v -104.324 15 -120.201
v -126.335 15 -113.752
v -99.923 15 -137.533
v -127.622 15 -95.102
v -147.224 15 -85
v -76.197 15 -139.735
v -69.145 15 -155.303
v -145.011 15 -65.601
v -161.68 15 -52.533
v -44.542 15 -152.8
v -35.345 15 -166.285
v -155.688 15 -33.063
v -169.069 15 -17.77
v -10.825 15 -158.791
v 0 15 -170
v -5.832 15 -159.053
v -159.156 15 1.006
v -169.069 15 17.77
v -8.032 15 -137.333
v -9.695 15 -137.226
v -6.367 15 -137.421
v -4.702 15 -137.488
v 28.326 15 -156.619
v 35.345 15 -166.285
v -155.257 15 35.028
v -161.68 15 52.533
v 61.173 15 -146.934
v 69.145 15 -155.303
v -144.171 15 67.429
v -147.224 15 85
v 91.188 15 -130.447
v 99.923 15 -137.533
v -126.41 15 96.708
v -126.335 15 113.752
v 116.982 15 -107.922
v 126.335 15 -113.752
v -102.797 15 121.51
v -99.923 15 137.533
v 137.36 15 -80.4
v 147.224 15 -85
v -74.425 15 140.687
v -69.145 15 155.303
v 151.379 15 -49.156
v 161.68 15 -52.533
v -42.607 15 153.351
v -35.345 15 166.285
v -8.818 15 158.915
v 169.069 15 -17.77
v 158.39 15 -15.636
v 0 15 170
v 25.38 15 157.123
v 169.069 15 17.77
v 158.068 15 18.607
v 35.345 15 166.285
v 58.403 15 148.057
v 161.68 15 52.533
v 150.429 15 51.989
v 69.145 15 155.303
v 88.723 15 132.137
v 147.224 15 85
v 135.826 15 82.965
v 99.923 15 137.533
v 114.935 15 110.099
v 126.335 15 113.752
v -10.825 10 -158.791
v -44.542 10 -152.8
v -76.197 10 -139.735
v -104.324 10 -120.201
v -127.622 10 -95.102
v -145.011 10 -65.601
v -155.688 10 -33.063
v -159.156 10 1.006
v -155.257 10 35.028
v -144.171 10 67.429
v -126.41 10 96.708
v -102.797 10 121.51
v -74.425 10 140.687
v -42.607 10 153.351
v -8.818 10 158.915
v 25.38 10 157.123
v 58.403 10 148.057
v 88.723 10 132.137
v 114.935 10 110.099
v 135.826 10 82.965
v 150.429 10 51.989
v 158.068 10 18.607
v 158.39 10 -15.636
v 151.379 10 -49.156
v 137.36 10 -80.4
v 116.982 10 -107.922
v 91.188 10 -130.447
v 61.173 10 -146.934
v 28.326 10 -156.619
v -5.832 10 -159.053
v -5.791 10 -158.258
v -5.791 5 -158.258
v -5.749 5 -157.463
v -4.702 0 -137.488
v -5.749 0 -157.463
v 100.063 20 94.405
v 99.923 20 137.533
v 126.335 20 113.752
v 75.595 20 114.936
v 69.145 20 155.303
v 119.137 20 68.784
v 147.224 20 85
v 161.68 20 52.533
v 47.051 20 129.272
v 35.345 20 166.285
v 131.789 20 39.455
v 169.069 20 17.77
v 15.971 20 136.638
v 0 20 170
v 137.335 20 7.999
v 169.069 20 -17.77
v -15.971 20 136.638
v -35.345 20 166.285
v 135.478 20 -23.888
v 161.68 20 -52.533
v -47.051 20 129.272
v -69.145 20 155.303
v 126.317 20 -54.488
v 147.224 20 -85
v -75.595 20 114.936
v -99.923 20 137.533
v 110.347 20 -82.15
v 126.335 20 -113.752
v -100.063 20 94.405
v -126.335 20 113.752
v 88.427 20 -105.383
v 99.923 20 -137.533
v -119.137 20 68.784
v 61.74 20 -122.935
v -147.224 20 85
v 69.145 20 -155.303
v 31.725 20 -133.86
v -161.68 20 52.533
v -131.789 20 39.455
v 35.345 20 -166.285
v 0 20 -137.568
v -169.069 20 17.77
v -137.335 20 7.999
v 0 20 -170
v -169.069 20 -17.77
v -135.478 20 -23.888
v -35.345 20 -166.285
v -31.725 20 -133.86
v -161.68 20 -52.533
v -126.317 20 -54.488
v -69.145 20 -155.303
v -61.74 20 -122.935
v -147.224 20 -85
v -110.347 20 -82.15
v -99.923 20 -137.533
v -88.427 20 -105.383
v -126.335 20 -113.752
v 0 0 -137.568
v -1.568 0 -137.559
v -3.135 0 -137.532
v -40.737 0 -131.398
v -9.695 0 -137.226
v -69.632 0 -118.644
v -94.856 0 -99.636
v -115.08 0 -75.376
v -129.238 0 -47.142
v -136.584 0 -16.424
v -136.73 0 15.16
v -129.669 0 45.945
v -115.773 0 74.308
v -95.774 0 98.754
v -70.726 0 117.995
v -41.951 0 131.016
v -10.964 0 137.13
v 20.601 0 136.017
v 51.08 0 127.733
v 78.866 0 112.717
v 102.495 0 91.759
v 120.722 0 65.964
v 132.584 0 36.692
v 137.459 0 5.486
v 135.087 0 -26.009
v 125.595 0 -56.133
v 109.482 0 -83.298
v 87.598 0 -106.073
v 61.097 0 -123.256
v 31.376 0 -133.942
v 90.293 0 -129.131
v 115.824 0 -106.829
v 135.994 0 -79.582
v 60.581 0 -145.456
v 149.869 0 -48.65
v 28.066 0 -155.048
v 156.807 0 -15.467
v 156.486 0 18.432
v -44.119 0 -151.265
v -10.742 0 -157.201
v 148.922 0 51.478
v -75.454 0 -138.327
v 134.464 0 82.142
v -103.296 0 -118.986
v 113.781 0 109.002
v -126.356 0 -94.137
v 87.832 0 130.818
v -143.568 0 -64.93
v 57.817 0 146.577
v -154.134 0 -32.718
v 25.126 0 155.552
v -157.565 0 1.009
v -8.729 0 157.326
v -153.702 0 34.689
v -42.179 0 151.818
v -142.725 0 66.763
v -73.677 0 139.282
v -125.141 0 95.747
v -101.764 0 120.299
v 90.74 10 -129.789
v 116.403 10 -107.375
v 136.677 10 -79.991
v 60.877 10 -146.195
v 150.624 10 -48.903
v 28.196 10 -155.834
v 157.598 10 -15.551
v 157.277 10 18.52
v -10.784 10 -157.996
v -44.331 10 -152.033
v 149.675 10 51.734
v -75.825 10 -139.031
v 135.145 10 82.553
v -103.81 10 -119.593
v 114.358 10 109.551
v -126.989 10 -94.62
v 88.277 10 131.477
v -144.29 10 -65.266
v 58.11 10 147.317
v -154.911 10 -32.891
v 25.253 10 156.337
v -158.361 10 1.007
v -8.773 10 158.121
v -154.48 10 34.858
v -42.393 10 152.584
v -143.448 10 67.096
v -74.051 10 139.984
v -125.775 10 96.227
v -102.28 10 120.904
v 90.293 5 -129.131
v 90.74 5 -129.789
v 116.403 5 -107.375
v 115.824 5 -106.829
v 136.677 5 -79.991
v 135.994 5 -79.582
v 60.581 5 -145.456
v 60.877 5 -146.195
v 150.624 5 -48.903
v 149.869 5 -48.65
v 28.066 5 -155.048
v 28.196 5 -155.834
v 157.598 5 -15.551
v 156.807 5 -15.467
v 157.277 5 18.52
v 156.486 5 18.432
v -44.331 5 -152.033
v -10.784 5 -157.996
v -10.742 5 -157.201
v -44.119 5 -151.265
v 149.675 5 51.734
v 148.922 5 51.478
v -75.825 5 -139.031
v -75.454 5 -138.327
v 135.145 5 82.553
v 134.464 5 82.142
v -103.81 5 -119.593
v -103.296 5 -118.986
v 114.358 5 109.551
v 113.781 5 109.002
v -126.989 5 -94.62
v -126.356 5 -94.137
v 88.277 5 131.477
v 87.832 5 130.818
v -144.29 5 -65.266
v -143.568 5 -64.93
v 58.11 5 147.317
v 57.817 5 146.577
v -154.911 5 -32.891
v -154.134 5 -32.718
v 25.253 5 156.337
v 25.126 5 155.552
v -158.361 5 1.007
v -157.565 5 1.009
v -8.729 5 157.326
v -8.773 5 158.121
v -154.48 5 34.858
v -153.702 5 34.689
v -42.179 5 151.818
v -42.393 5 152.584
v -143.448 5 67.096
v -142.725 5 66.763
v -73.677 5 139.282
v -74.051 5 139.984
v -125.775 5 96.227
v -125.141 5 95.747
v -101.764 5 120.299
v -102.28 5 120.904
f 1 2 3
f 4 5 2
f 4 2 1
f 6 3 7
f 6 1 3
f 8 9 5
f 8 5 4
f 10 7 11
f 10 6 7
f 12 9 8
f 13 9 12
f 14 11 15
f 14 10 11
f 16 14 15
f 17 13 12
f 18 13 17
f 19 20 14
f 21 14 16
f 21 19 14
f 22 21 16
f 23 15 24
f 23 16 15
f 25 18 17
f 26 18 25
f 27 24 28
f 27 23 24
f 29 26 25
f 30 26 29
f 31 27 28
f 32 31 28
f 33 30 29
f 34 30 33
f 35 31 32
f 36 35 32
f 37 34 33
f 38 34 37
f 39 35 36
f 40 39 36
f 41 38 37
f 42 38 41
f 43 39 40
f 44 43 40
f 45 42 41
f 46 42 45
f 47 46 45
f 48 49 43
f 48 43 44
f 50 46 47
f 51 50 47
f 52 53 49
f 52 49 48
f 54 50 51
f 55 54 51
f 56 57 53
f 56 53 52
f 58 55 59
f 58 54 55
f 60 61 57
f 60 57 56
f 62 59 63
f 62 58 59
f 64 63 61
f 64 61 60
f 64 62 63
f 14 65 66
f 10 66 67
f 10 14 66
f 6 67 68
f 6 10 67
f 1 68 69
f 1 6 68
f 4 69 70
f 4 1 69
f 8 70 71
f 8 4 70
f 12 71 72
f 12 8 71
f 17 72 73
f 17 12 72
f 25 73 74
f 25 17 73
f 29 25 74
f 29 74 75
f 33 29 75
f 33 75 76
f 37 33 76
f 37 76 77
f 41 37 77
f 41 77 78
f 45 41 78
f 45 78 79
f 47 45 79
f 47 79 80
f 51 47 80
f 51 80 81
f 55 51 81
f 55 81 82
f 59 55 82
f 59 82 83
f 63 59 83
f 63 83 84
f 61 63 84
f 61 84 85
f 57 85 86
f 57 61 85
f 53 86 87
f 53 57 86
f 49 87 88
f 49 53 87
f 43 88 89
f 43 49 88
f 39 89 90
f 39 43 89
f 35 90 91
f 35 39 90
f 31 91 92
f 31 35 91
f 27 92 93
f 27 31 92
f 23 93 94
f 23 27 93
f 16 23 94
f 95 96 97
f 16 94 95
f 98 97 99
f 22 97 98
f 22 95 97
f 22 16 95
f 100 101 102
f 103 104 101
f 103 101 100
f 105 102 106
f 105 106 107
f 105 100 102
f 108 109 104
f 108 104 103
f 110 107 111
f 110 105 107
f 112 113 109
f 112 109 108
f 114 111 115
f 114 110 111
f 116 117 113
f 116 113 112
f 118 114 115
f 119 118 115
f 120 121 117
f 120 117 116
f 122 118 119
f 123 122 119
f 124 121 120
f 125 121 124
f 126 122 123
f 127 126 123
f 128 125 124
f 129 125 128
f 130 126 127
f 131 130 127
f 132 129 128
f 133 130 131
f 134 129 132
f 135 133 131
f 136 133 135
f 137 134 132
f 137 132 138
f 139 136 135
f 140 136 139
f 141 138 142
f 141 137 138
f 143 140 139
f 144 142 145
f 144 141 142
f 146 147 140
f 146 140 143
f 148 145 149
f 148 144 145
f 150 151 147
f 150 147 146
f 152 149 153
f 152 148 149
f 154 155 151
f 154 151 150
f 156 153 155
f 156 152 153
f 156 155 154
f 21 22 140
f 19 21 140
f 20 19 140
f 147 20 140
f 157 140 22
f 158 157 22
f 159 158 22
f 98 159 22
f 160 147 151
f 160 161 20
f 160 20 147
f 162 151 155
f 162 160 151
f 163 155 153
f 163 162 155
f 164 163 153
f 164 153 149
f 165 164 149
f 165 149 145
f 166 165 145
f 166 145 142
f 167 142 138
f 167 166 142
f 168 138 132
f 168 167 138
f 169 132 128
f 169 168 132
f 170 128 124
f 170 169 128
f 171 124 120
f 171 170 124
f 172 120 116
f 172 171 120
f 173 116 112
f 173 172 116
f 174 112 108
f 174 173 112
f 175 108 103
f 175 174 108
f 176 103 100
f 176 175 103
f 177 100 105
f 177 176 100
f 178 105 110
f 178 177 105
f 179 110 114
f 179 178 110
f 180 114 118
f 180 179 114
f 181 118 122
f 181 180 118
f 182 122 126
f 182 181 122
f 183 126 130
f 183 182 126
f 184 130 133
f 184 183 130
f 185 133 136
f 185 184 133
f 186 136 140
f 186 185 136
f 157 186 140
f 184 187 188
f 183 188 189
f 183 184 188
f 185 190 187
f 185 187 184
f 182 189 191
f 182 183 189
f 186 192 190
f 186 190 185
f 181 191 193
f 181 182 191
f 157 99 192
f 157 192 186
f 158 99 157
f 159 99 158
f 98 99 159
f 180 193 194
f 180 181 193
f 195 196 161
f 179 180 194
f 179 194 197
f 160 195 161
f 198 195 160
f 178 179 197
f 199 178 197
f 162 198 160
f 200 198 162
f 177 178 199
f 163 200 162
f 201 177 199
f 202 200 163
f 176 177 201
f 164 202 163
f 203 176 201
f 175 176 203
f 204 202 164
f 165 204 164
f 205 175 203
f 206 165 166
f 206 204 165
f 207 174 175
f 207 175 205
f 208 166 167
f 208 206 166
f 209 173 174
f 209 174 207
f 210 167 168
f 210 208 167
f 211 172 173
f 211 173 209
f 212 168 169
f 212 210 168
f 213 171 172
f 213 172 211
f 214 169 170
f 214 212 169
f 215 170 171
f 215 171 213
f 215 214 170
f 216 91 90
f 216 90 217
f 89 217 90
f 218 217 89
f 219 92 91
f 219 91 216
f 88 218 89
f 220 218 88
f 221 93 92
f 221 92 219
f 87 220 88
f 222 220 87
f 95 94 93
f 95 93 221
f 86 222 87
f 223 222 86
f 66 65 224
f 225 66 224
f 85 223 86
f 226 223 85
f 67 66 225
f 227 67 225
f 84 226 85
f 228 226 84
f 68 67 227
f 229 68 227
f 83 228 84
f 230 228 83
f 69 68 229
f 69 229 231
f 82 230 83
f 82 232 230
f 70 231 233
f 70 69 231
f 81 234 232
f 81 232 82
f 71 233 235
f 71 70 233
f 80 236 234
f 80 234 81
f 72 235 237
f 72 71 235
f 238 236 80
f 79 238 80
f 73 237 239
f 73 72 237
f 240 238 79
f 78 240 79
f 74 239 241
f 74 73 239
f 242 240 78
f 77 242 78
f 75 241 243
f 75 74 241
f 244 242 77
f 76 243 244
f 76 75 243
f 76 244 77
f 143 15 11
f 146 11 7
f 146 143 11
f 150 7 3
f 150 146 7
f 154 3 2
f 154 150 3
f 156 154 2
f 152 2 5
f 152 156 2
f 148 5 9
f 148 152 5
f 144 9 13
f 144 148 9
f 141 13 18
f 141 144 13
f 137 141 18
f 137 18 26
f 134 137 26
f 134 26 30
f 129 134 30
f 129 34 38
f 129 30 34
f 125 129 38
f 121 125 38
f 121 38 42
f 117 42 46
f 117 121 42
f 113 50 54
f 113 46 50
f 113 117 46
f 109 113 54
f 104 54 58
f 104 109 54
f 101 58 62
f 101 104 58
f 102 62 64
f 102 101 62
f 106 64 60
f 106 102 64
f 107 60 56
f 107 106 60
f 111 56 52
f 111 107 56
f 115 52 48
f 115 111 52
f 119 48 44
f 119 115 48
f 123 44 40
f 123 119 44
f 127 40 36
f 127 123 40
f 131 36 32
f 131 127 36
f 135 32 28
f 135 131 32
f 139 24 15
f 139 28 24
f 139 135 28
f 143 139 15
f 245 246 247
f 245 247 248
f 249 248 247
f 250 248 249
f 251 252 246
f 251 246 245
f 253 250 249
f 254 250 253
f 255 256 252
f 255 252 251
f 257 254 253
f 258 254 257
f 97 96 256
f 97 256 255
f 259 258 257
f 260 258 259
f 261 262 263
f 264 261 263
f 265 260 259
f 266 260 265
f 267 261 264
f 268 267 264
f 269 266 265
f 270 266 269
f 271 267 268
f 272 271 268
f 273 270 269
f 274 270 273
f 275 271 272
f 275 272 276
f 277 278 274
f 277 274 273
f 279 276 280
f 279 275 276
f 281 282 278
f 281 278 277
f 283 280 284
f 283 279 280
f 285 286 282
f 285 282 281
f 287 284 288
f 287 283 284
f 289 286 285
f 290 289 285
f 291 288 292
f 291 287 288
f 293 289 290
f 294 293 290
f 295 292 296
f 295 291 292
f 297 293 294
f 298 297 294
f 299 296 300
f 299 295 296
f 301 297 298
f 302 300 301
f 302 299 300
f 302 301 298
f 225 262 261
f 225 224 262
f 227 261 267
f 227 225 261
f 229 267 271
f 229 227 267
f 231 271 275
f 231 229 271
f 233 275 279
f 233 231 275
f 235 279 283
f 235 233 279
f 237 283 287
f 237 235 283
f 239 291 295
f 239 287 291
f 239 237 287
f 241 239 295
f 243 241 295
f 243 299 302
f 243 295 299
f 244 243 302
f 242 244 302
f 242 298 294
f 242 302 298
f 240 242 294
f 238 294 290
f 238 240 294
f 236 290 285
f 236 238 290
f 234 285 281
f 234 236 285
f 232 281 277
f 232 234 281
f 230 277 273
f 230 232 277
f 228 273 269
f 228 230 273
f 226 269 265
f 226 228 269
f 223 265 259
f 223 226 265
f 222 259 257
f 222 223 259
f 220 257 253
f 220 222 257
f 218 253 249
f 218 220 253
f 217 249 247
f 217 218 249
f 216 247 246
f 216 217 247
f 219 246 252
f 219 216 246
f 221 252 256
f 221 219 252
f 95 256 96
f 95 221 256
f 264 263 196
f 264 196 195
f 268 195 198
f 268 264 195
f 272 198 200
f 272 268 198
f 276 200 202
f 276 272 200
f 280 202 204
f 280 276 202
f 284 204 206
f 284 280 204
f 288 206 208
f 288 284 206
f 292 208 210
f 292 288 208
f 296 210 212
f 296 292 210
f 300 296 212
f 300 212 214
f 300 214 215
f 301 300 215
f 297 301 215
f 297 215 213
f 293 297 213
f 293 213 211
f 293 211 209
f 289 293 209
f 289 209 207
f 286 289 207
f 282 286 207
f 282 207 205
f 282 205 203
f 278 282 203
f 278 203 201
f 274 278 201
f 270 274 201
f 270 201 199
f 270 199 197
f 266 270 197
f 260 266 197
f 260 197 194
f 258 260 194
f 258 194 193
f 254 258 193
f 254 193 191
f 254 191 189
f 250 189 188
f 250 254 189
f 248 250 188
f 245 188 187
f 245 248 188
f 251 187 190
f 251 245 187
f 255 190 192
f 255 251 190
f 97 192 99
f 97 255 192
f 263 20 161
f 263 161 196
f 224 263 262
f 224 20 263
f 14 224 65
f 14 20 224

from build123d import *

# Parameters (mm, degrees)
ENL_V_MAT_EXTRU_1_DEPTH = 20.395702365


with BuildPart() as part:
    # Esquisse1 → Révolution1 (revolve)
    with BuildSketch(Plane.XY, mode=Mode.PRIVATE) as r_volution1_sk:
        Polygon((157.568040745, 0), (157.568040745, 5), (158.36383893, 5), (158.36383893, 10), (159.159637116, 10), (159.159637116, 15), (170, 15), (170, 20), (137.568040745, 20), (137.568040745, 0), align=None)
    revolve(r_volution1_sk.sketch.rotate(Axis((0, 0, 0), (0, 1, 0)), 90), axis=Axis((0, 0, 0), (0, 1, 0)))

    # Esquisse2 → Enlèv. mat.-Extru.1 (cut)
    with BuildSketch(Plane.XZ.offset(-15)):
        Polygon((-9.406937207, -131.726748145), (-11.551478732, -172.647038111), (-6.558331058, -172.908717892), (-4.413789534, -131.988427927), align=None)
    extrude(amount=ENL_V_MAT_EXTRU_1_DEPTH, mode=Mode.SUBTRACT)


solid = part.part
